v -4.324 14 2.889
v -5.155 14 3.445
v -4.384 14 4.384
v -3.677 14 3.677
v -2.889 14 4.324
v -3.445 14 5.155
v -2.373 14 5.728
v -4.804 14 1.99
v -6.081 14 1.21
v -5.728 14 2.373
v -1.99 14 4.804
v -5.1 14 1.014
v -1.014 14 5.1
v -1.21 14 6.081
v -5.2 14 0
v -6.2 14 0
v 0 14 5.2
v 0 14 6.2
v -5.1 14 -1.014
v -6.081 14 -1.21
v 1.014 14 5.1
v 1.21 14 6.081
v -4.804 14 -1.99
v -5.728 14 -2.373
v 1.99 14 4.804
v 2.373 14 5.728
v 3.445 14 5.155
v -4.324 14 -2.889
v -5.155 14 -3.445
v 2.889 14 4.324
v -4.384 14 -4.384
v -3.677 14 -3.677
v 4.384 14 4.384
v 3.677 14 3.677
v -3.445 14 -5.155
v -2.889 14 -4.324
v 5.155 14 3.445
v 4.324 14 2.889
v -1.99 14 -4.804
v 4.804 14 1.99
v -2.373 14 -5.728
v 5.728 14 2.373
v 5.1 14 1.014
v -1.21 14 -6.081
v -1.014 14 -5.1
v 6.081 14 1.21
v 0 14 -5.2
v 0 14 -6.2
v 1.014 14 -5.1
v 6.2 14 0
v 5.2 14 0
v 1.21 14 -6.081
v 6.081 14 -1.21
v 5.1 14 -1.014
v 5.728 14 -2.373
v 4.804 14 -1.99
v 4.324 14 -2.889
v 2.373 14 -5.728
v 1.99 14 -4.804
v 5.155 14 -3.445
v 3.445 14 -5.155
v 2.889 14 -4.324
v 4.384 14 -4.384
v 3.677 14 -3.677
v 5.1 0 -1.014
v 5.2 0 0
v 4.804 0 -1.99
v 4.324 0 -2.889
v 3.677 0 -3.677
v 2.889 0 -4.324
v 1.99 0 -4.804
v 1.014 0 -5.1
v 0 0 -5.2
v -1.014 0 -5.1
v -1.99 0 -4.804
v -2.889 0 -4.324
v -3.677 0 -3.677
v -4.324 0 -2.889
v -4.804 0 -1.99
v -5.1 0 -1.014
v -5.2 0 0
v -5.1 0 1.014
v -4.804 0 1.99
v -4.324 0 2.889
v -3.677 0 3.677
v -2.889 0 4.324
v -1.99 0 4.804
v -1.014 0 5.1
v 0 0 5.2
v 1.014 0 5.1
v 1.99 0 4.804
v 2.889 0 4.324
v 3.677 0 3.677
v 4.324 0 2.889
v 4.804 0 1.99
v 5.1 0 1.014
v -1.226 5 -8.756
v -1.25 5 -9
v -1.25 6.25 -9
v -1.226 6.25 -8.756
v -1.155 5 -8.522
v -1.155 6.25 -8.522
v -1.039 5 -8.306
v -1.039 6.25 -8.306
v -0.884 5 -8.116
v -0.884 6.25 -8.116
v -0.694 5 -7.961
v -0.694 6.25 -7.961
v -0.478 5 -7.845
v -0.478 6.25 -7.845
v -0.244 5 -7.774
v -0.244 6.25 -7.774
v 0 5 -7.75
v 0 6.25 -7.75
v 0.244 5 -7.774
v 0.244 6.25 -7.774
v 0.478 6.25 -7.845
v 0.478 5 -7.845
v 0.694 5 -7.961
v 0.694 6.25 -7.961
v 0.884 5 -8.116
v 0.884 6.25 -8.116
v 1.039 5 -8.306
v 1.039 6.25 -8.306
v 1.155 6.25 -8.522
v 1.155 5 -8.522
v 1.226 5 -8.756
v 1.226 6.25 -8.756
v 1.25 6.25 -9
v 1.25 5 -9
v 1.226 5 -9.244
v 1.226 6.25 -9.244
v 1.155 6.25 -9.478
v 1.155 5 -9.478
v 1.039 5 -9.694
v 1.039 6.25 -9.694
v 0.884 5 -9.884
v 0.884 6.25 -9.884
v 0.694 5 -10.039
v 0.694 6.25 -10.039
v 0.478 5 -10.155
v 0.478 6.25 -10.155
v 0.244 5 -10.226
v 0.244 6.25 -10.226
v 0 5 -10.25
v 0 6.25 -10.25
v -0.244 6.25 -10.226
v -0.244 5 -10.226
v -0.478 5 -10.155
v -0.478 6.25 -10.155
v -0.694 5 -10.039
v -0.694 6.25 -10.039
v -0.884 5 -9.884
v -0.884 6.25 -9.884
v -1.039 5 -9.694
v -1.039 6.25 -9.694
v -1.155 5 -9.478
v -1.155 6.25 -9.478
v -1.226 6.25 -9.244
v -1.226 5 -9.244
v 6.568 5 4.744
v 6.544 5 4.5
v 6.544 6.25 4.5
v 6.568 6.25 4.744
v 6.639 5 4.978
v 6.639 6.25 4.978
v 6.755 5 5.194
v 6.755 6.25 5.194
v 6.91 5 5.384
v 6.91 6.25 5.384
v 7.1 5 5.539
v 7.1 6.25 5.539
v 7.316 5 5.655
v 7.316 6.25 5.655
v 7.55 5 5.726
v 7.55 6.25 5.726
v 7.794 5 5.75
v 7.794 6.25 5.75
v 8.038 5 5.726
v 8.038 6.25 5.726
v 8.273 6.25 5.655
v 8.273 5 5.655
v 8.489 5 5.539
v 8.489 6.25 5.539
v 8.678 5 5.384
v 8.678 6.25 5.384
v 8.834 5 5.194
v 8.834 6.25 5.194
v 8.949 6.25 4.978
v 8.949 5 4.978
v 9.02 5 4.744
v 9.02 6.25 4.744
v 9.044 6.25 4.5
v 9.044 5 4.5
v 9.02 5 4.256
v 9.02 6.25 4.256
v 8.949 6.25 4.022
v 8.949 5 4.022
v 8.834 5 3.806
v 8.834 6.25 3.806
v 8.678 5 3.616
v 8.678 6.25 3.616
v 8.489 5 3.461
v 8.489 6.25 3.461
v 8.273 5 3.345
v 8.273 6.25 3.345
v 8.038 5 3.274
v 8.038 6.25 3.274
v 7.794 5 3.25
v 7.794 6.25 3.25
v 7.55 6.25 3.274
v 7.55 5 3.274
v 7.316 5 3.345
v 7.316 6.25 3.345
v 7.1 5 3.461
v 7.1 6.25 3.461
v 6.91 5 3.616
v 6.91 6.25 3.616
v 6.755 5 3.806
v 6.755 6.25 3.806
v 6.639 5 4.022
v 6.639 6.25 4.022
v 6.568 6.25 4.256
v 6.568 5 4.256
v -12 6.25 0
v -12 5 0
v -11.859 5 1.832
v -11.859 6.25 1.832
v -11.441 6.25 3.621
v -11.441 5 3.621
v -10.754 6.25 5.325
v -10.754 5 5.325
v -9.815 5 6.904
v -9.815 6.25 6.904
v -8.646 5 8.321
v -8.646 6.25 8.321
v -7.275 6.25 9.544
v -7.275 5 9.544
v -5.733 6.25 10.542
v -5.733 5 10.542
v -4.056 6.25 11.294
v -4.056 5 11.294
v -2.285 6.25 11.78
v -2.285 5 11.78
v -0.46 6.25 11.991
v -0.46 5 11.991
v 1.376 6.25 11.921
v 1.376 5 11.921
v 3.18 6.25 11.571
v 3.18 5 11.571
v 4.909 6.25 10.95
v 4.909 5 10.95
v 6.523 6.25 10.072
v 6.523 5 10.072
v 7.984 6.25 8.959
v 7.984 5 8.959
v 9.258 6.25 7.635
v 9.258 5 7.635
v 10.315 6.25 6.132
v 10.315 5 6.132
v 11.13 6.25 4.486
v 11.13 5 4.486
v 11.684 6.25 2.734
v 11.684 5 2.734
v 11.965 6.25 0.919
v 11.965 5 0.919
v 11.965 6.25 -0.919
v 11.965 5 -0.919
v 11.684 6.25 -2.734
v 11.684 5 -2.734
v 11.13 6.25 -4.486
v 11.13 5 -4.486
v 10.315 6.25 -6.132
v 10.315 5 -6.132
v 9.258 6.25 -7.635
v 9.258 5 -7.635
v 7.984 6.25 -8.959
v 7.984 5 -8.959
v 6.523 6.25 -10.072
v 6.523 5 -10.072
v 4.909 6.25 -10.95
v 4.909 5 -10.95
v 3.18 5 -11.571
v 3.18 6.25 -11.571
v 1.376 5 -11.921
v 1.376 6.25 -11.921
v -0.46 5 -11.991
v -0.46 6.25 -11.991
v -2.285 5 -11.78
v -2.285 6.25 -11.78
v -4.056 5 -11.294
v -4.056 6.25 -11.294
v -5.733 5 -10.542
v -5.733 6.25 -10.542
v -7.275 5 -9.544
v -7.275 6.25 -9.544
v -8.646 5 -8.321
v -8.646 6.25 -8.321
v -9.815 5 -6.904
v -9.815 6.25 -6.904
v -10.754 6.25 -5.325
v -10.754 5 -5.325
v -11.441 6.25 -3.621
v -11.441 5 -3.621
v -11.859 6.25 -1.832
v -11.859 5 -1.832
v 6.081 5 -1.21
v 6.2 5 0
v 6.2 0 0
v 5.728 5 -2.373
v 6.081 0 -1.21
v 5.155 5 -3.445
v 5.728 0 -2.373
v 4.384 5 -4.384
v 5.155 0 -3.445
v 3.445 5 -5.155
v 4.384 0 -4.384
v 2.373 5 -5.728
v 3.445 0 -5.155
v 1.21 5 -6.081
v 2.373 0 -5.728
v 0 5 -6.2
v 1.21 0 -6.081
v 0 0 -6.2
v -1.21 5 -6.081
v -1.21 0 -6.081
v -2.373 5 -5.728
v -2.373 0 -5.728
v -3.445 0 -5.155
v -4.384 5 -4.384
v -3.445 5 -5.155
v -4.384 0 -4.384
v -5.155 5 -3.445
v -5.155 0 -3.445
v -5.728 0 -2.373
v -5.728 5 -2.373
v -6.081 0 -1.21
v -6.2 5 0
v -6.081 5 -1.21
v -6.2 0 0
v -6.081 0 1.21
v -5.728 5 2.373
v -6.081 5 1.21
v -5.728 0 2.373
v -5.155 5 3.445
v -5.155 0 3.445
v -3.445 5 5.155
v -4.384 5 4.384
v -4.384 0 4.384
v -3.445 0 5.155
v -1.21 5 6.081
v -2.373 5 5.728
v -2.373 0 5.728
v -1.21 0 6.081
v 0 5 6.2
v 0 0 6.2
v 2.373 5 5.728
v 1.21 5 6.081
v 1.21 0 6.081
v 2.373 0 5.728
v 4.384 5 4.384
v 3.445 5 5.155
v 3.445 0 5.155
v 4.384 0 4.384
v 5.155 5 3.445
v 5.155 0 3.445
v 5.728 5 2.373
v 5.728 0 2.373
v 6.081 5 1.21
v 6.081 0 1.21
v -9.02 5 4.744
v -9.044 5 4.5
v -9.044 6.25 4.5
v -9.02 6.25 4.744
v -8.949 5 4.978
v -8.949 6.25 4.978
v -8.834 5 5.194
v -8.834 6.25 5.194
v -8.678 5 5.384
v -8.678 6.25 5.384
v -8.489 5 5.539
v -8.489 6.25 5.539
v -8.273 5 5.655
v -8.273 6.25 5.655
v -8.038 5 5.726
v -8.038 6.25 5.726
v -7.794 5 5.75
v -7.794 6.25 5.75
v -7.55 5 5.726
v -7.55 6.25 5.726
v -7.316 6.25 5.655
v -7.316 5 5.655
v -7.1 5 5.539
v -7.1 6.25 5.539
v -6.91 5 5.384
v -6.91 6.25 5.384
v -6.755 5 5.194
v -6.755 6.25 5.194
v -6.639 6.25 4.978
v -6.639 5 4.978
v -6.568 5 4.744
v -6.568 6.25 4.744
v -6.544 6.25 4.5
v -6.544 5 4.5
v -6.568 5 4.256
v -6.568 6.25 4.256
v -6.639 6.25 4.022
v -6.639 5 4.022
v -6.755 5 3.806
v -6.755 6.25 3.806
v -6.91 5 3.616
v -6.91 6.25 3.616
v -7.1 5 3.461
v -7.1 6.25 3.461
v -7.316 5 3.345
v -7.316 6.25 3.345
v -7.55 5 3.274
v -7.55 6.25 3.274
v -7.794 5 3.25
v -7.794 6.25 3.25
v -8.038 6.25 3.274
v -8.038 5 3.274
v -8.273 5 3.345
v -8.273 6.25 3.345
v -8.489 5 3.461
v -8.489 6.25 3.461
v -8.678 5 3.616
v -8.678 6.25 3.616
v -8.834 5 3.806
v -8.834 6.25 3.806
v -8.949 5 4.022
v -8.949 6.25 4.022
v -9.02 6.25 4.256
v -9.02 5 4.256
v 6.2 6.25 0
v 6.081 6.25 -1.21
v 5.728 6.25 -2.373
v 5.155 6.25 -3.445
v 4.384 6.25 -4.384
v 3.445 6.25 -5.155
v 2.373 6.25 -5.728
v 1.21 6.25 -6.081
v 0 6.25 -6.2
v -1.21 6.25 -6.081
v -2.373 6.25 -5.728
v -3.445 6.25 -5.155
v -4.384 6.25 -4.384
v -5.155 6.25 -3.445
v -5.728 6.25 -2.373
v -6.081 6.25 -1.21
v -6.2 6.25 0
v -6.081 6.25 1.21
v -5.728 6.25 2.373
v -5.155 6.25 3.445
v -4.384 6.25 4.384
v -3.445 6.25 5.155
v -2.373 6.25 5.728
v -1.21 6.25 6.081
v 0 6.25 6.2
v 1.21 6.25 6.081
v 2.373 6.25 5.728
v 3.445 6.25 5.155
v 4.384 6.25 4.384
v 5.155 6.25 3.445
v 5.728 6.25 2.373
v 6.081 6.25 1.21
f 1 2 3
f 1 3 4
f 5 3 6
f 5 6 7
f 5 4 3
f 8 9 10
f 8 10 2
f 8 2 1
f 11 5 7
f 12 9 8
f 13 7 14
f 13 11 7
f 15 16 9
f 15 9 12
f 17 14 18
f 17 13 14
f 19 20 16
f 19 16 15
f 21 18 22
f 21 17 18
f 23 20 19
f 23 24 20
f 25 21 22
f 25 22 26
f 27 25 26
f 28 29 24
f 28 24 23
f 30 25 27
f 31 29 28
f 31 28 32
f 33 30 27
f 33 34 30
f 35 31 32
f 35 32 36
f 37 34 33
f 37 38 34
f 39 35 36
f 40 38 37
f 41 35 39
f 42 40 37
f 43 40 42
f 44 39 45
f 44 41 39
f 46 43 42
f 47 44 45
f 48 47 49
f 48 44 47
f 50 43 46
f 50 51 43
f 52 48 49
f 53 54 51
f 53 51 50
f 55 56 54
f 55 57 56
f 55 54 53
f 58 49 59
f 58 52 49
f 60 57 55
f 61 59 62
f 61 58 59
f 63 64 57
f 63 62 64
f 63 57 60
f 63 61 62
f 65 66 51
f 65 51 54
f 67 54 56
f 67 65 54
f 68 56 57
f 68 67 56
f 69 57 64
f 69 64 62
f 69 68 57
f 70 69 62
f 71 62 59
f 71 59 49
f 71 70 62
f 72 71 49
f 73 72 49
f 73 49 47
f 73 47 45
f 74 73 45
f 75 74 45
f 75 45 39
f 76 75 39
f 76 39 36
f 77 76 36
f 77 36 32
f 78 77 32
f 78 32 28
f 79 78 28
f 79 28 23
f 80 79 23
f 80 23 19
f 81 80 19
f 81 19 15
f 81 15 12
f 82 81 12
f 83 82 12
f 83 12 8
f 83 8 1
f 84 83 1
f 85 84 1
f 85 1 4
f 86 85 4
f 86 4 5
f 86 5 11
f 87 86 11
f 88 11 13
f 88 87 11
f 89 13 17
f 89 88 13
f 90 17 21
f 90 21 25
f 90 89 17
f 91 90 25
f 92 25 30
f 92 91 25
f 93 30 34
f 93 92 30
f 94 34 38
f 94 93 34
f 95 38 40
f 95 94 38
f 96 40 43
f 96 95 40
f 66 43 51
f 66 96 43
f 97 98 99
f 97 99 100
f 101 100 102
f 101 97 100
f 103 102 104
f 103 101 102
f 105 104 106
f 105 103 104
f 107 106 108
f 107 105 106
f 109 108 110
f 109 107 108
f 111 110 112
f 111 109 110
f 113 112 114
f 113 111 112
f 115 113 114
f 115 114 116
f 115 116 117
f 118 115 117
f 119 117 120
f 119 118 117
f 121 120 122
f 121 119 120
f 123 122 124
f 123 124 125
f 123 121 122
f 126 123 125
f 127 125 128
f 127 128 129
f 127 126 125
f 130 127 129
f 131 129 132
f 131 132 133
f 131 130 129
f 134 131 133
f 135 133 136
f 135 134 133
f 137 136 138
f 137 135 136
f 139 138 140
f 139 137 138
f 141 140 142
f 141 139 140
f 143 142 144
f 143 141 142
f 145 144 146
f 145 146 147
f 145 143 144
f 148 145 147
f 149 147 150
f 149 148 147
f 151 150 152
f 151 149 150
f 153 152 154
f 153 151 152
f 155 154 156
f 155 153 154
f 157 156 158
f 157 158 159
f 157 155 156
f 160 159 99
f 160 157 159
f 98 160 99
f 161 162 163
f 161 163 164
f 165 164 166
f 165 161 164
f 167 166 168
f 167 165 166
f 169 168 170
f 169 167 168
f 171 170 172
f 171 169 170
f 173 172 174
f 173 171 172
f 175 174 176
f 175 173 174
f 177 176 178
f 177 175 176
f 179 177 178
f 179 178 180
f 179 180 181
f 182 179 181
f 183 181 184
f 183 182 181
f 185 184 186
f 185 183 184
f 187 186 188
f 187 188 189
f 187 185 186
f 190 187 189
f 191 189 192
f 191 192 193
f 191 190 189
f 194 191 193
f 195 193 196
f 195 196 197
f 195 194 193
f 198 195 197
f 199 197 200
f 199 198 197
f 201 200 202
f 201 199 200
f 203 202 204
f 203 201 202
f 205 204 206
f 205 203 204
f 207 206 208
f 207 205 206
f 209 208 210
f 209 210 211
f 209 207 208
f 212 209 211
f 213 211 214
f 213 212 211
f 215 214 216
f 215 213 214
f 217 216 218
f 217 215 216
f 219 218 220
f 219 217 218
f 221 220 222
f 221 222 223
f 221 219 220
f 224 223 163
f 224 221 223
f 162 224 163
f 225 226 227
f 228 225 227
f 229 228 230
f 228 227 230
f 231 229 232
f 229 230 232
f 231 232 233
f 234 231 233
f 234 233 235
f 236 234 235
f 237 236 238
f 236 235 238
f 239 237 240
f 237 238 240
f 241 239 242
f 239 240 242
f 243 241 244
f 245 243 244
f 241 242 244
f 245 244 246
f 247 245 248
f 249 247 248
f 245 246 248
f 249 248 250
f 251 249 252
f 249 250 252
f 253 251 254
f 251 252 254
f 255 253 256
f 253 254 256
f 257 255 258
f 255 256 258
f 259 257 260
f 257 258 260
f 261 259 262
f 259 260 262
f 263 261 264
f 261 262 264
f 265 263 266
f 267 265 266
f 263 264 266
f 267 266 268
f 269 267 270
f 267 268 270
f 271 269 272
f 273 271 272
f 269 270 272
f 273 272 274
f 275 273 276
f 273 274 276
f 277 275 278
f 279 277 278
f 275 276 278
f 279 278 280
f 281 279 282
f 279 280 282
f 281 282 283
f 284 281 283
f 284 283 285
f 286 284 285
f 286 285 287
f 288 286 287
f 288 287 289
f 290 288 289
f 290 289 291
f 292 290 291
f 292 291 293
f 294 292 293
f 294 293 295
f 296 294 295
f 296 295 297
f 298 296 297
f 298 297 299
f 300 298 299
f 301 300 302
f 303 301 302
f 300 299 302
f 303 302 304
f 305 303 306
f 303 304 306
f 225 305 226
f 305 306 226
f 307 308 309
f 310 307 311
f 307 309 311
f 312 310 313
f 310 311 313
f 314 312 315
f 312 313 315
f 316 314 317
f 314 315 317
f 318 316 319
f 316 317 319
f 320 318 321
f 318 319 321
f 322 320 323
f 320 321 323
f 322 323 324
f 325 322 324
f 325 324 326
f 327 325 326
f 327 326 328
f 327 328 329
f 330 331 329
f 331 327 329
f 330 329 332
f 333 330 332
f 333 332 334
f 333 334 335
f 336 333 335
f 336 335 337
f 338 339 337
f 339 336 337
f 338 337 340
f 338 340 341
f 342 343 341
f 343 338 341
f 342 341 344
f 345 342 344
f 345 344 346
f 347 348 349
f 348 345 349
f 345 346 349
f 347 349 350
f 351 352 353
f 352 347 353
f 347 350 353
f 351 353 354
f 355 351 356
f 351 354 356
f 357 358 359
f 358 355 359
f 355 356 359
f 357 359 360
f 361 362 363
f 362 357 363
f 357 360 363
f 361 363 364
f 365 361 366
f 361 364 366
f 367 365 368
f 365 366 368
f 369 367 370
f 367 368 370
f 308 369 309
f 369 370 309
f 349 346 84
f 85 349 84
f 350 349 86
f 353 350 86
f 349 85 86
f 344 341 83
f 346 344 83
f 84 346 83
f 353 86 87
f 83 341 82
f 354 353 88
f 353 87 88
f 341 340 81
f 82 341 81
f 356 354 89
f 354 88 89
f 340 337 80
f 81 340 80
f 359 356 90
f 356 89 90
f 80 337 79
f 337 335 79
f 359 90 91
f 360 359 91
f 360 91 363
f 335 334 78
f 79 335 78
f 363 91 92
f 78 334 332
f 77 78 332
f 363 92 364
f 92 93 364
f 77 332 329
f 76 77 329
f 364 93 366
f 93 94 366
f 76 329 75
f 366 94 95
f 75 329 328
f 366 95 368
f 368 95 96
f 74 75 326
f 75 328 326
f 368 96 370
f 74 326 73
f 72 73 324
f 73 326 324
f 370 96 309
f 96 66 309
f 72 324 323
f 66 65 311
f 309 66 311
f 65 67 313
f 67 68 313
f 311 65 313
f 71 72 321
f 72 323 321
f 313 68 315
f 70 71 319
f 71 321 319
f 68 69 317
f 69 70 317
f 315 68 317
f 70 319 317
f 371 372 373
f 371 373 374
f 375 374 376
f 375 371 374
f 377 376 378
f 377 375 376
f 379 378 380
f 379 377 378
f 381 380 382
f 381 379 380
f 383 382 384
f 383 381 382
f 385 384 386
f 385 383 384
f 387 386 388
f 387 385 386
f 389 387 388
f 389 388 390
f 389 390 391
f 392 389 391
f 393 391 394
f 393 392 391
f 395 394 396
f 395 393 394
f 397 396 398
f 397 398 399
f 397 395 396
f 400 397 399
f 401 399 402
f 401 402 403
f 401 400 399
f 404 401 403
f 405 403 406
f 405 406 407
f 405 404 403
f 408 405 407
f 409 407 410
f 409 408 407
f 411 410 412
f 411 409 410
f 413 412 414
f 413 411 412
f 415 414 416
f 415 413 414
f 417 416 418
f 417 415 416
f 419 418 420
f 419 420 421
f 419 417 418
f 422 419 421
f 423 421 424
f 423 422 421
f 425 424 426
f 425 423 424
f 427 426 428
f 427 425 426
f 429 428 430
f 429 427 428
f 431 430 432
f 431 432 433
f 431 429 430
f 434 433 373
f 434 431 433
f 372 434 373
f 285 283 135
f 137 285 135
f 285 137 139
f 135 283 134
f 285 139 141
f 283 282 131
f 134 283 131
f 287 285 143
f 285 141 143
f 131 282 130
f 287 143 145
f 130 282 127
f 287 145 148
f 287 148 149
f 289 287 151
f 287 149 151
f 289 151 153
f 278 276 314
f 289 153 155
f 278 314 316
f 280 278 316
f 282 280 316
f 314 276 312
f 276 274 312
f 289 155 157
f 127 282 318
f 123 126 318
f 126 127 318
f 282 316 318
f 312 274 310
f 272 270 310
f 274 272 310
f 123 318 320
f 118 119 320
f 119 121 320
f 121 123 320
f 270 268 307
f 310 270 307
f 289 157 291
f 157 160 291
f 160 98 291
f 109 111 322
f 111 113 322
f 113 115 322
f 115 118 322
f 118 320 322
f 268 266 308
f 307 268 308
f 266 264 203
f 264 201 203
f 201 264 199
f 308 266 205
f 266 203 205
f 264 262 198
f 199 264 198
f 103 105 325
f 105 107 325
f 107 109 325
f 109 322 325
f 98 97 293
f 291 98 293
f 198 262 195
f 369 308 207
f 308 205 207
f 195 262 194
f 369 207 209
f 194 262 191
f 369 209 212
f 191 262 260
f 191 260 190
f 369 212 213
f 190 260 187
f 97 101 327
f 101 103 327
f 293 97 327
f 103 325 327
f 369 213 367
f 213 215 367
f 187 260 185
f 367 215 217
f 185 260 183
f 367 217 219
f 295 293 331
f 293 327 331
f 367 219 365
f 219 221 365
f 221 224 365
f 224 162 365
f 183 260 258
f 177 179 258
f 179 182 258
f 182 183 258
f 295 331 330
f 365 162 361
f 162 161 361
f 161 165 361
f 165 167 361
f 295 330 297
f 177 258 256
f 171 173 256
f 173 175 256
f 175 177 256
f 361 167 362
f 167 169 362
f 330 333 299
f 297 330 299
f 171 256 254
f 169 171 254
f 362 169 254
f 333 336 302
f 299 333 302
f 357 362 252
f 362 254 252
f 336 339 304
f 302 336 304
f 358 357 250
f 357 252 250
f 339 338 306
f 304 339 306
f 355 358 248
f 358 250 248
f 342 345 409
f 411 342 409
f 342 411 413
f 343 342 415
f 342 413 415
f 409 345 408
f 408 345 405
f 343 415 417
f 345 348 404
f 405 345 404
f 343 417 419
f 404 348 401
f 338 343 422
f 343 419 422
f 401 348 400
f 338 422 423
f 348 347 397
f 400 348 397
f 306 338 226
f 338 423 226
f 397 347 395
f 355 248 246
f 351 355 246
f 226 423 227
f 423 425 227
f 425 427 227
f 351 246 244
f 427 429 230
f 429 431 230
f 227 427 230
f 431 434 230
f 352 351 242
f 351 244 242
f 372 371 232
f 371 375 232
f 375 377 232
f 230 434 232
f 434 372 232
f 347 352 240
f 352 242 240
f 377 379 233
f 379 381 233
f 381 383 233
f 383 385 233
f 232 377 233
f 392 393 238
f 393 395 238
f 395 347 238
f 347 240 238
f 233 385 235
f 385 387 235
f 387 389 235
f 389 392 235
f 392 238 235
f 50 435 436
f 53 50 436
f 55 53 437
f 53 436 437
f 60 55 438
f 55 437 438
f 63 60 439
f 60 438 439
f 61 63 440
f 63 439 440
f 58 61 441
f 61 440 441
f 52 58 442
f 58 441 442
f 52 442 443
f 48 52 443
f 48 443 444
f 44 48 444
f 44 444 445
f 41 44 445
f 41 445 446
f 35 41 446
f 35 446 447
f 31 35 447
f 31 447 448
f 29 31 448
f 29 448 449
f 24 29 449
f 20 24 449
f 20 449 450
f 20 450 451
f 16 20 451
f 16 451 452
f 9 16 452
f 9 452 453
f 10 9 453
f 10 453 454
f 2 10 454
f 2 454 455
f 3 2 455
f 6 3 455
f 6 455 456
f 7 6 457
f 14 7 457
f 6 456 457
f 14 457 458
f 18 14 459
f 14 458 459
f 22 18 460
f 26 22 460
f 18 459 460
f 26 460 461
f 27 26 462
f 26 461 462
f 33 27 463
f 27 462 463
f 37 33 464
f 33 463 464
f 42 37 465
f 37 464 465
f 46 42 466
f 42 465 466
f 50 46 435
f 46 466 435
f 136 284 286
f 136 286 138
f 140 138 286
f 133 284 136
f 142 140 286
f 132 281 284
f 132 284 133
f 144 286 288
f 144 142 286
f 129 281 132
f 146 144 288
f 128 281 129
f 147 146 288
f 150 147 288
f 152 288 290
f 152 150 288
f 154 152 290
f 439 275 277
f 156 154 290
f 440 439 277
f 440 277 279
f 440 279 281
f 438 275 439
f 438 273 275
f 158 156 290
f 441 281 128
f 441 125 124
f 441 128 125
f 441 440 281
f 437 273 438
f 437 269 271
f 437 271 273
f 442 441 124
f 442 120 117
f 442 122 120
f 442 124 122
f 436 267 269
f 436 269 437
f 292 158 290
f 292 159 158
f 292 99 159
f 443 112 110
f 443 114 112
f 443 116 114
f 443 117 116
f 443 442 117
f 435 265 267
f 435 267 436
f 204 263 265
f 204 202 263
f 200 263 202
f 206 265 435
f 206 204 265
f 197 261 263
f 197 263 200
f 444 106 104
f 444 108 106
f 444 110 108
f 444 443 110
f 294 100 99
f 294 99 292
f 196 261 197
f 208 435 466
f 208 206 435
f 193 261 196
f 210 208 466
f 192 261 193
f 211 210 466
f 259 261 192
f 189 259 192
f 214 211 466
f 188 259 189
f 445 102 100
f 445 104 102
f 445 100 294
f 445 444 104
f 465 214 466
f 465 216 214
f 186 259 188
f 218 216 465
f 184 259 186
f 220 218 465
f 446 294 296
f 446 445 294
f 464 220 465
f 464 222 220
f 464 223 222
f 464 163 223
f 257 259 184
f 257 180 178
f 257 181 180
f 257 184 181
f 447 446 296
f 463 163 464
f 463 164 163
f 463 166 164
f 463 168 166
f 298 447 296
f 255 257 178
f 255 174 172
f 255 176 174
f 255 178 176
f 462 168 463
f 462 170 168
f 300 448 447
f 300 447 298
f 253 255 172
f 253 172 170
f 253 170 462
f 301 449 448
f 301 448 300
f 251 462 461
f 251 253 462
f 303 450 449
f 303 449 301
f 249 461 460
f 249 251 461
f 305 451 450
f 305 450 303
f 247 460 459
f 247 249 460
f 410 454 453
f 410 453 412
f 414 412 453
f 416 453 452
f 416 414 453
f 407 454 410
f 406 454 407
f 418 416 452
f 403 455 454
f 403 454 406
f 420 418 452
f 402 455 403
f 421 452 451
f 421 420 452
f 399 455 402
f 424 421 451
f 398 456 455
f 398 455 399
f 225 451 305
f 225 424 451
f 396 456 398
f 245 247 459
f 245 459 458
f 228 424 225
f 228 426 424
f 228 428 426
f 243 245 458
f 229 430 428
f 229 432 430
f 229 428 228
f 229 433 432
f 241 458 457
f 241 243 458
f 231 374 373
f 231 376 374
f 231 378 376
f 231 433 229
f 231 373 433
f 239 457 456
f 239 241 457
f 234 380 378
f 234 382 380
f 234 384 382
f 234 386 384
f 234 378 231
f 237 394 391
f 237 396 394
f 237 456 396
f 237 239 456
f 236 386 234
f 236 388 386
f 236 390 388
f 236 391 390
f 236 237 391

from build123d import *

# Parameters (mm, degrees)
SKETCH1_R           = 6.2
SKETCH1_R_2         = 5.2
BOSS_EXTRUDE1_DEPTH = 14
SKETCH2_R           = 12
SKETCH2_R_2         = 1.25
SKETCH2_R_3         = 5.2
BOSS_EXTRUDE2_DEPTH = 1.25


with BuildPart() as part:
    # Sketch1 → Boss-Extrude1 (new body)
    with BuildSketch(Plane(origin=(0, 0, 0), x_dir=(1, 0, 0), z_dir=(0, 1, 0))):
        Circle(SKETCH1_R)
        Circle(SKETCH1_R_2, mode=Mode.SUBTRACT)
    extrude(amount=BOSS_EXTRUDE1_DEPTH)

    # Sketch2 → Boss-Extrude2 (add)
    with BuildSketch(Plane(origin=(0, 4.999999906, 0), x_dir=(-1, 0, 0), z_dir=(0, 1, 0))):
        Circle(SKETCH2_R)
        with Locations((0, -9)):
            Circle(SKETCH2_R_2, mode=Mode.SUBTRACT)
        with Locations((-7.794228634, 4.5)):
            Circle(SKETCH2_R_2, mode=Mode.SUBTRACT)
        with Locations((7.794228634, 4.5)):
            Circle(SKETCH2_R_2, mode=Mode.SUBTRACT)
        Circle(SKETCH2_R_3, mode=Mode.SUBTRACT)
    extrude(amount=BOSS_EXTRUDE2_DEPTH)


solid = part.part
